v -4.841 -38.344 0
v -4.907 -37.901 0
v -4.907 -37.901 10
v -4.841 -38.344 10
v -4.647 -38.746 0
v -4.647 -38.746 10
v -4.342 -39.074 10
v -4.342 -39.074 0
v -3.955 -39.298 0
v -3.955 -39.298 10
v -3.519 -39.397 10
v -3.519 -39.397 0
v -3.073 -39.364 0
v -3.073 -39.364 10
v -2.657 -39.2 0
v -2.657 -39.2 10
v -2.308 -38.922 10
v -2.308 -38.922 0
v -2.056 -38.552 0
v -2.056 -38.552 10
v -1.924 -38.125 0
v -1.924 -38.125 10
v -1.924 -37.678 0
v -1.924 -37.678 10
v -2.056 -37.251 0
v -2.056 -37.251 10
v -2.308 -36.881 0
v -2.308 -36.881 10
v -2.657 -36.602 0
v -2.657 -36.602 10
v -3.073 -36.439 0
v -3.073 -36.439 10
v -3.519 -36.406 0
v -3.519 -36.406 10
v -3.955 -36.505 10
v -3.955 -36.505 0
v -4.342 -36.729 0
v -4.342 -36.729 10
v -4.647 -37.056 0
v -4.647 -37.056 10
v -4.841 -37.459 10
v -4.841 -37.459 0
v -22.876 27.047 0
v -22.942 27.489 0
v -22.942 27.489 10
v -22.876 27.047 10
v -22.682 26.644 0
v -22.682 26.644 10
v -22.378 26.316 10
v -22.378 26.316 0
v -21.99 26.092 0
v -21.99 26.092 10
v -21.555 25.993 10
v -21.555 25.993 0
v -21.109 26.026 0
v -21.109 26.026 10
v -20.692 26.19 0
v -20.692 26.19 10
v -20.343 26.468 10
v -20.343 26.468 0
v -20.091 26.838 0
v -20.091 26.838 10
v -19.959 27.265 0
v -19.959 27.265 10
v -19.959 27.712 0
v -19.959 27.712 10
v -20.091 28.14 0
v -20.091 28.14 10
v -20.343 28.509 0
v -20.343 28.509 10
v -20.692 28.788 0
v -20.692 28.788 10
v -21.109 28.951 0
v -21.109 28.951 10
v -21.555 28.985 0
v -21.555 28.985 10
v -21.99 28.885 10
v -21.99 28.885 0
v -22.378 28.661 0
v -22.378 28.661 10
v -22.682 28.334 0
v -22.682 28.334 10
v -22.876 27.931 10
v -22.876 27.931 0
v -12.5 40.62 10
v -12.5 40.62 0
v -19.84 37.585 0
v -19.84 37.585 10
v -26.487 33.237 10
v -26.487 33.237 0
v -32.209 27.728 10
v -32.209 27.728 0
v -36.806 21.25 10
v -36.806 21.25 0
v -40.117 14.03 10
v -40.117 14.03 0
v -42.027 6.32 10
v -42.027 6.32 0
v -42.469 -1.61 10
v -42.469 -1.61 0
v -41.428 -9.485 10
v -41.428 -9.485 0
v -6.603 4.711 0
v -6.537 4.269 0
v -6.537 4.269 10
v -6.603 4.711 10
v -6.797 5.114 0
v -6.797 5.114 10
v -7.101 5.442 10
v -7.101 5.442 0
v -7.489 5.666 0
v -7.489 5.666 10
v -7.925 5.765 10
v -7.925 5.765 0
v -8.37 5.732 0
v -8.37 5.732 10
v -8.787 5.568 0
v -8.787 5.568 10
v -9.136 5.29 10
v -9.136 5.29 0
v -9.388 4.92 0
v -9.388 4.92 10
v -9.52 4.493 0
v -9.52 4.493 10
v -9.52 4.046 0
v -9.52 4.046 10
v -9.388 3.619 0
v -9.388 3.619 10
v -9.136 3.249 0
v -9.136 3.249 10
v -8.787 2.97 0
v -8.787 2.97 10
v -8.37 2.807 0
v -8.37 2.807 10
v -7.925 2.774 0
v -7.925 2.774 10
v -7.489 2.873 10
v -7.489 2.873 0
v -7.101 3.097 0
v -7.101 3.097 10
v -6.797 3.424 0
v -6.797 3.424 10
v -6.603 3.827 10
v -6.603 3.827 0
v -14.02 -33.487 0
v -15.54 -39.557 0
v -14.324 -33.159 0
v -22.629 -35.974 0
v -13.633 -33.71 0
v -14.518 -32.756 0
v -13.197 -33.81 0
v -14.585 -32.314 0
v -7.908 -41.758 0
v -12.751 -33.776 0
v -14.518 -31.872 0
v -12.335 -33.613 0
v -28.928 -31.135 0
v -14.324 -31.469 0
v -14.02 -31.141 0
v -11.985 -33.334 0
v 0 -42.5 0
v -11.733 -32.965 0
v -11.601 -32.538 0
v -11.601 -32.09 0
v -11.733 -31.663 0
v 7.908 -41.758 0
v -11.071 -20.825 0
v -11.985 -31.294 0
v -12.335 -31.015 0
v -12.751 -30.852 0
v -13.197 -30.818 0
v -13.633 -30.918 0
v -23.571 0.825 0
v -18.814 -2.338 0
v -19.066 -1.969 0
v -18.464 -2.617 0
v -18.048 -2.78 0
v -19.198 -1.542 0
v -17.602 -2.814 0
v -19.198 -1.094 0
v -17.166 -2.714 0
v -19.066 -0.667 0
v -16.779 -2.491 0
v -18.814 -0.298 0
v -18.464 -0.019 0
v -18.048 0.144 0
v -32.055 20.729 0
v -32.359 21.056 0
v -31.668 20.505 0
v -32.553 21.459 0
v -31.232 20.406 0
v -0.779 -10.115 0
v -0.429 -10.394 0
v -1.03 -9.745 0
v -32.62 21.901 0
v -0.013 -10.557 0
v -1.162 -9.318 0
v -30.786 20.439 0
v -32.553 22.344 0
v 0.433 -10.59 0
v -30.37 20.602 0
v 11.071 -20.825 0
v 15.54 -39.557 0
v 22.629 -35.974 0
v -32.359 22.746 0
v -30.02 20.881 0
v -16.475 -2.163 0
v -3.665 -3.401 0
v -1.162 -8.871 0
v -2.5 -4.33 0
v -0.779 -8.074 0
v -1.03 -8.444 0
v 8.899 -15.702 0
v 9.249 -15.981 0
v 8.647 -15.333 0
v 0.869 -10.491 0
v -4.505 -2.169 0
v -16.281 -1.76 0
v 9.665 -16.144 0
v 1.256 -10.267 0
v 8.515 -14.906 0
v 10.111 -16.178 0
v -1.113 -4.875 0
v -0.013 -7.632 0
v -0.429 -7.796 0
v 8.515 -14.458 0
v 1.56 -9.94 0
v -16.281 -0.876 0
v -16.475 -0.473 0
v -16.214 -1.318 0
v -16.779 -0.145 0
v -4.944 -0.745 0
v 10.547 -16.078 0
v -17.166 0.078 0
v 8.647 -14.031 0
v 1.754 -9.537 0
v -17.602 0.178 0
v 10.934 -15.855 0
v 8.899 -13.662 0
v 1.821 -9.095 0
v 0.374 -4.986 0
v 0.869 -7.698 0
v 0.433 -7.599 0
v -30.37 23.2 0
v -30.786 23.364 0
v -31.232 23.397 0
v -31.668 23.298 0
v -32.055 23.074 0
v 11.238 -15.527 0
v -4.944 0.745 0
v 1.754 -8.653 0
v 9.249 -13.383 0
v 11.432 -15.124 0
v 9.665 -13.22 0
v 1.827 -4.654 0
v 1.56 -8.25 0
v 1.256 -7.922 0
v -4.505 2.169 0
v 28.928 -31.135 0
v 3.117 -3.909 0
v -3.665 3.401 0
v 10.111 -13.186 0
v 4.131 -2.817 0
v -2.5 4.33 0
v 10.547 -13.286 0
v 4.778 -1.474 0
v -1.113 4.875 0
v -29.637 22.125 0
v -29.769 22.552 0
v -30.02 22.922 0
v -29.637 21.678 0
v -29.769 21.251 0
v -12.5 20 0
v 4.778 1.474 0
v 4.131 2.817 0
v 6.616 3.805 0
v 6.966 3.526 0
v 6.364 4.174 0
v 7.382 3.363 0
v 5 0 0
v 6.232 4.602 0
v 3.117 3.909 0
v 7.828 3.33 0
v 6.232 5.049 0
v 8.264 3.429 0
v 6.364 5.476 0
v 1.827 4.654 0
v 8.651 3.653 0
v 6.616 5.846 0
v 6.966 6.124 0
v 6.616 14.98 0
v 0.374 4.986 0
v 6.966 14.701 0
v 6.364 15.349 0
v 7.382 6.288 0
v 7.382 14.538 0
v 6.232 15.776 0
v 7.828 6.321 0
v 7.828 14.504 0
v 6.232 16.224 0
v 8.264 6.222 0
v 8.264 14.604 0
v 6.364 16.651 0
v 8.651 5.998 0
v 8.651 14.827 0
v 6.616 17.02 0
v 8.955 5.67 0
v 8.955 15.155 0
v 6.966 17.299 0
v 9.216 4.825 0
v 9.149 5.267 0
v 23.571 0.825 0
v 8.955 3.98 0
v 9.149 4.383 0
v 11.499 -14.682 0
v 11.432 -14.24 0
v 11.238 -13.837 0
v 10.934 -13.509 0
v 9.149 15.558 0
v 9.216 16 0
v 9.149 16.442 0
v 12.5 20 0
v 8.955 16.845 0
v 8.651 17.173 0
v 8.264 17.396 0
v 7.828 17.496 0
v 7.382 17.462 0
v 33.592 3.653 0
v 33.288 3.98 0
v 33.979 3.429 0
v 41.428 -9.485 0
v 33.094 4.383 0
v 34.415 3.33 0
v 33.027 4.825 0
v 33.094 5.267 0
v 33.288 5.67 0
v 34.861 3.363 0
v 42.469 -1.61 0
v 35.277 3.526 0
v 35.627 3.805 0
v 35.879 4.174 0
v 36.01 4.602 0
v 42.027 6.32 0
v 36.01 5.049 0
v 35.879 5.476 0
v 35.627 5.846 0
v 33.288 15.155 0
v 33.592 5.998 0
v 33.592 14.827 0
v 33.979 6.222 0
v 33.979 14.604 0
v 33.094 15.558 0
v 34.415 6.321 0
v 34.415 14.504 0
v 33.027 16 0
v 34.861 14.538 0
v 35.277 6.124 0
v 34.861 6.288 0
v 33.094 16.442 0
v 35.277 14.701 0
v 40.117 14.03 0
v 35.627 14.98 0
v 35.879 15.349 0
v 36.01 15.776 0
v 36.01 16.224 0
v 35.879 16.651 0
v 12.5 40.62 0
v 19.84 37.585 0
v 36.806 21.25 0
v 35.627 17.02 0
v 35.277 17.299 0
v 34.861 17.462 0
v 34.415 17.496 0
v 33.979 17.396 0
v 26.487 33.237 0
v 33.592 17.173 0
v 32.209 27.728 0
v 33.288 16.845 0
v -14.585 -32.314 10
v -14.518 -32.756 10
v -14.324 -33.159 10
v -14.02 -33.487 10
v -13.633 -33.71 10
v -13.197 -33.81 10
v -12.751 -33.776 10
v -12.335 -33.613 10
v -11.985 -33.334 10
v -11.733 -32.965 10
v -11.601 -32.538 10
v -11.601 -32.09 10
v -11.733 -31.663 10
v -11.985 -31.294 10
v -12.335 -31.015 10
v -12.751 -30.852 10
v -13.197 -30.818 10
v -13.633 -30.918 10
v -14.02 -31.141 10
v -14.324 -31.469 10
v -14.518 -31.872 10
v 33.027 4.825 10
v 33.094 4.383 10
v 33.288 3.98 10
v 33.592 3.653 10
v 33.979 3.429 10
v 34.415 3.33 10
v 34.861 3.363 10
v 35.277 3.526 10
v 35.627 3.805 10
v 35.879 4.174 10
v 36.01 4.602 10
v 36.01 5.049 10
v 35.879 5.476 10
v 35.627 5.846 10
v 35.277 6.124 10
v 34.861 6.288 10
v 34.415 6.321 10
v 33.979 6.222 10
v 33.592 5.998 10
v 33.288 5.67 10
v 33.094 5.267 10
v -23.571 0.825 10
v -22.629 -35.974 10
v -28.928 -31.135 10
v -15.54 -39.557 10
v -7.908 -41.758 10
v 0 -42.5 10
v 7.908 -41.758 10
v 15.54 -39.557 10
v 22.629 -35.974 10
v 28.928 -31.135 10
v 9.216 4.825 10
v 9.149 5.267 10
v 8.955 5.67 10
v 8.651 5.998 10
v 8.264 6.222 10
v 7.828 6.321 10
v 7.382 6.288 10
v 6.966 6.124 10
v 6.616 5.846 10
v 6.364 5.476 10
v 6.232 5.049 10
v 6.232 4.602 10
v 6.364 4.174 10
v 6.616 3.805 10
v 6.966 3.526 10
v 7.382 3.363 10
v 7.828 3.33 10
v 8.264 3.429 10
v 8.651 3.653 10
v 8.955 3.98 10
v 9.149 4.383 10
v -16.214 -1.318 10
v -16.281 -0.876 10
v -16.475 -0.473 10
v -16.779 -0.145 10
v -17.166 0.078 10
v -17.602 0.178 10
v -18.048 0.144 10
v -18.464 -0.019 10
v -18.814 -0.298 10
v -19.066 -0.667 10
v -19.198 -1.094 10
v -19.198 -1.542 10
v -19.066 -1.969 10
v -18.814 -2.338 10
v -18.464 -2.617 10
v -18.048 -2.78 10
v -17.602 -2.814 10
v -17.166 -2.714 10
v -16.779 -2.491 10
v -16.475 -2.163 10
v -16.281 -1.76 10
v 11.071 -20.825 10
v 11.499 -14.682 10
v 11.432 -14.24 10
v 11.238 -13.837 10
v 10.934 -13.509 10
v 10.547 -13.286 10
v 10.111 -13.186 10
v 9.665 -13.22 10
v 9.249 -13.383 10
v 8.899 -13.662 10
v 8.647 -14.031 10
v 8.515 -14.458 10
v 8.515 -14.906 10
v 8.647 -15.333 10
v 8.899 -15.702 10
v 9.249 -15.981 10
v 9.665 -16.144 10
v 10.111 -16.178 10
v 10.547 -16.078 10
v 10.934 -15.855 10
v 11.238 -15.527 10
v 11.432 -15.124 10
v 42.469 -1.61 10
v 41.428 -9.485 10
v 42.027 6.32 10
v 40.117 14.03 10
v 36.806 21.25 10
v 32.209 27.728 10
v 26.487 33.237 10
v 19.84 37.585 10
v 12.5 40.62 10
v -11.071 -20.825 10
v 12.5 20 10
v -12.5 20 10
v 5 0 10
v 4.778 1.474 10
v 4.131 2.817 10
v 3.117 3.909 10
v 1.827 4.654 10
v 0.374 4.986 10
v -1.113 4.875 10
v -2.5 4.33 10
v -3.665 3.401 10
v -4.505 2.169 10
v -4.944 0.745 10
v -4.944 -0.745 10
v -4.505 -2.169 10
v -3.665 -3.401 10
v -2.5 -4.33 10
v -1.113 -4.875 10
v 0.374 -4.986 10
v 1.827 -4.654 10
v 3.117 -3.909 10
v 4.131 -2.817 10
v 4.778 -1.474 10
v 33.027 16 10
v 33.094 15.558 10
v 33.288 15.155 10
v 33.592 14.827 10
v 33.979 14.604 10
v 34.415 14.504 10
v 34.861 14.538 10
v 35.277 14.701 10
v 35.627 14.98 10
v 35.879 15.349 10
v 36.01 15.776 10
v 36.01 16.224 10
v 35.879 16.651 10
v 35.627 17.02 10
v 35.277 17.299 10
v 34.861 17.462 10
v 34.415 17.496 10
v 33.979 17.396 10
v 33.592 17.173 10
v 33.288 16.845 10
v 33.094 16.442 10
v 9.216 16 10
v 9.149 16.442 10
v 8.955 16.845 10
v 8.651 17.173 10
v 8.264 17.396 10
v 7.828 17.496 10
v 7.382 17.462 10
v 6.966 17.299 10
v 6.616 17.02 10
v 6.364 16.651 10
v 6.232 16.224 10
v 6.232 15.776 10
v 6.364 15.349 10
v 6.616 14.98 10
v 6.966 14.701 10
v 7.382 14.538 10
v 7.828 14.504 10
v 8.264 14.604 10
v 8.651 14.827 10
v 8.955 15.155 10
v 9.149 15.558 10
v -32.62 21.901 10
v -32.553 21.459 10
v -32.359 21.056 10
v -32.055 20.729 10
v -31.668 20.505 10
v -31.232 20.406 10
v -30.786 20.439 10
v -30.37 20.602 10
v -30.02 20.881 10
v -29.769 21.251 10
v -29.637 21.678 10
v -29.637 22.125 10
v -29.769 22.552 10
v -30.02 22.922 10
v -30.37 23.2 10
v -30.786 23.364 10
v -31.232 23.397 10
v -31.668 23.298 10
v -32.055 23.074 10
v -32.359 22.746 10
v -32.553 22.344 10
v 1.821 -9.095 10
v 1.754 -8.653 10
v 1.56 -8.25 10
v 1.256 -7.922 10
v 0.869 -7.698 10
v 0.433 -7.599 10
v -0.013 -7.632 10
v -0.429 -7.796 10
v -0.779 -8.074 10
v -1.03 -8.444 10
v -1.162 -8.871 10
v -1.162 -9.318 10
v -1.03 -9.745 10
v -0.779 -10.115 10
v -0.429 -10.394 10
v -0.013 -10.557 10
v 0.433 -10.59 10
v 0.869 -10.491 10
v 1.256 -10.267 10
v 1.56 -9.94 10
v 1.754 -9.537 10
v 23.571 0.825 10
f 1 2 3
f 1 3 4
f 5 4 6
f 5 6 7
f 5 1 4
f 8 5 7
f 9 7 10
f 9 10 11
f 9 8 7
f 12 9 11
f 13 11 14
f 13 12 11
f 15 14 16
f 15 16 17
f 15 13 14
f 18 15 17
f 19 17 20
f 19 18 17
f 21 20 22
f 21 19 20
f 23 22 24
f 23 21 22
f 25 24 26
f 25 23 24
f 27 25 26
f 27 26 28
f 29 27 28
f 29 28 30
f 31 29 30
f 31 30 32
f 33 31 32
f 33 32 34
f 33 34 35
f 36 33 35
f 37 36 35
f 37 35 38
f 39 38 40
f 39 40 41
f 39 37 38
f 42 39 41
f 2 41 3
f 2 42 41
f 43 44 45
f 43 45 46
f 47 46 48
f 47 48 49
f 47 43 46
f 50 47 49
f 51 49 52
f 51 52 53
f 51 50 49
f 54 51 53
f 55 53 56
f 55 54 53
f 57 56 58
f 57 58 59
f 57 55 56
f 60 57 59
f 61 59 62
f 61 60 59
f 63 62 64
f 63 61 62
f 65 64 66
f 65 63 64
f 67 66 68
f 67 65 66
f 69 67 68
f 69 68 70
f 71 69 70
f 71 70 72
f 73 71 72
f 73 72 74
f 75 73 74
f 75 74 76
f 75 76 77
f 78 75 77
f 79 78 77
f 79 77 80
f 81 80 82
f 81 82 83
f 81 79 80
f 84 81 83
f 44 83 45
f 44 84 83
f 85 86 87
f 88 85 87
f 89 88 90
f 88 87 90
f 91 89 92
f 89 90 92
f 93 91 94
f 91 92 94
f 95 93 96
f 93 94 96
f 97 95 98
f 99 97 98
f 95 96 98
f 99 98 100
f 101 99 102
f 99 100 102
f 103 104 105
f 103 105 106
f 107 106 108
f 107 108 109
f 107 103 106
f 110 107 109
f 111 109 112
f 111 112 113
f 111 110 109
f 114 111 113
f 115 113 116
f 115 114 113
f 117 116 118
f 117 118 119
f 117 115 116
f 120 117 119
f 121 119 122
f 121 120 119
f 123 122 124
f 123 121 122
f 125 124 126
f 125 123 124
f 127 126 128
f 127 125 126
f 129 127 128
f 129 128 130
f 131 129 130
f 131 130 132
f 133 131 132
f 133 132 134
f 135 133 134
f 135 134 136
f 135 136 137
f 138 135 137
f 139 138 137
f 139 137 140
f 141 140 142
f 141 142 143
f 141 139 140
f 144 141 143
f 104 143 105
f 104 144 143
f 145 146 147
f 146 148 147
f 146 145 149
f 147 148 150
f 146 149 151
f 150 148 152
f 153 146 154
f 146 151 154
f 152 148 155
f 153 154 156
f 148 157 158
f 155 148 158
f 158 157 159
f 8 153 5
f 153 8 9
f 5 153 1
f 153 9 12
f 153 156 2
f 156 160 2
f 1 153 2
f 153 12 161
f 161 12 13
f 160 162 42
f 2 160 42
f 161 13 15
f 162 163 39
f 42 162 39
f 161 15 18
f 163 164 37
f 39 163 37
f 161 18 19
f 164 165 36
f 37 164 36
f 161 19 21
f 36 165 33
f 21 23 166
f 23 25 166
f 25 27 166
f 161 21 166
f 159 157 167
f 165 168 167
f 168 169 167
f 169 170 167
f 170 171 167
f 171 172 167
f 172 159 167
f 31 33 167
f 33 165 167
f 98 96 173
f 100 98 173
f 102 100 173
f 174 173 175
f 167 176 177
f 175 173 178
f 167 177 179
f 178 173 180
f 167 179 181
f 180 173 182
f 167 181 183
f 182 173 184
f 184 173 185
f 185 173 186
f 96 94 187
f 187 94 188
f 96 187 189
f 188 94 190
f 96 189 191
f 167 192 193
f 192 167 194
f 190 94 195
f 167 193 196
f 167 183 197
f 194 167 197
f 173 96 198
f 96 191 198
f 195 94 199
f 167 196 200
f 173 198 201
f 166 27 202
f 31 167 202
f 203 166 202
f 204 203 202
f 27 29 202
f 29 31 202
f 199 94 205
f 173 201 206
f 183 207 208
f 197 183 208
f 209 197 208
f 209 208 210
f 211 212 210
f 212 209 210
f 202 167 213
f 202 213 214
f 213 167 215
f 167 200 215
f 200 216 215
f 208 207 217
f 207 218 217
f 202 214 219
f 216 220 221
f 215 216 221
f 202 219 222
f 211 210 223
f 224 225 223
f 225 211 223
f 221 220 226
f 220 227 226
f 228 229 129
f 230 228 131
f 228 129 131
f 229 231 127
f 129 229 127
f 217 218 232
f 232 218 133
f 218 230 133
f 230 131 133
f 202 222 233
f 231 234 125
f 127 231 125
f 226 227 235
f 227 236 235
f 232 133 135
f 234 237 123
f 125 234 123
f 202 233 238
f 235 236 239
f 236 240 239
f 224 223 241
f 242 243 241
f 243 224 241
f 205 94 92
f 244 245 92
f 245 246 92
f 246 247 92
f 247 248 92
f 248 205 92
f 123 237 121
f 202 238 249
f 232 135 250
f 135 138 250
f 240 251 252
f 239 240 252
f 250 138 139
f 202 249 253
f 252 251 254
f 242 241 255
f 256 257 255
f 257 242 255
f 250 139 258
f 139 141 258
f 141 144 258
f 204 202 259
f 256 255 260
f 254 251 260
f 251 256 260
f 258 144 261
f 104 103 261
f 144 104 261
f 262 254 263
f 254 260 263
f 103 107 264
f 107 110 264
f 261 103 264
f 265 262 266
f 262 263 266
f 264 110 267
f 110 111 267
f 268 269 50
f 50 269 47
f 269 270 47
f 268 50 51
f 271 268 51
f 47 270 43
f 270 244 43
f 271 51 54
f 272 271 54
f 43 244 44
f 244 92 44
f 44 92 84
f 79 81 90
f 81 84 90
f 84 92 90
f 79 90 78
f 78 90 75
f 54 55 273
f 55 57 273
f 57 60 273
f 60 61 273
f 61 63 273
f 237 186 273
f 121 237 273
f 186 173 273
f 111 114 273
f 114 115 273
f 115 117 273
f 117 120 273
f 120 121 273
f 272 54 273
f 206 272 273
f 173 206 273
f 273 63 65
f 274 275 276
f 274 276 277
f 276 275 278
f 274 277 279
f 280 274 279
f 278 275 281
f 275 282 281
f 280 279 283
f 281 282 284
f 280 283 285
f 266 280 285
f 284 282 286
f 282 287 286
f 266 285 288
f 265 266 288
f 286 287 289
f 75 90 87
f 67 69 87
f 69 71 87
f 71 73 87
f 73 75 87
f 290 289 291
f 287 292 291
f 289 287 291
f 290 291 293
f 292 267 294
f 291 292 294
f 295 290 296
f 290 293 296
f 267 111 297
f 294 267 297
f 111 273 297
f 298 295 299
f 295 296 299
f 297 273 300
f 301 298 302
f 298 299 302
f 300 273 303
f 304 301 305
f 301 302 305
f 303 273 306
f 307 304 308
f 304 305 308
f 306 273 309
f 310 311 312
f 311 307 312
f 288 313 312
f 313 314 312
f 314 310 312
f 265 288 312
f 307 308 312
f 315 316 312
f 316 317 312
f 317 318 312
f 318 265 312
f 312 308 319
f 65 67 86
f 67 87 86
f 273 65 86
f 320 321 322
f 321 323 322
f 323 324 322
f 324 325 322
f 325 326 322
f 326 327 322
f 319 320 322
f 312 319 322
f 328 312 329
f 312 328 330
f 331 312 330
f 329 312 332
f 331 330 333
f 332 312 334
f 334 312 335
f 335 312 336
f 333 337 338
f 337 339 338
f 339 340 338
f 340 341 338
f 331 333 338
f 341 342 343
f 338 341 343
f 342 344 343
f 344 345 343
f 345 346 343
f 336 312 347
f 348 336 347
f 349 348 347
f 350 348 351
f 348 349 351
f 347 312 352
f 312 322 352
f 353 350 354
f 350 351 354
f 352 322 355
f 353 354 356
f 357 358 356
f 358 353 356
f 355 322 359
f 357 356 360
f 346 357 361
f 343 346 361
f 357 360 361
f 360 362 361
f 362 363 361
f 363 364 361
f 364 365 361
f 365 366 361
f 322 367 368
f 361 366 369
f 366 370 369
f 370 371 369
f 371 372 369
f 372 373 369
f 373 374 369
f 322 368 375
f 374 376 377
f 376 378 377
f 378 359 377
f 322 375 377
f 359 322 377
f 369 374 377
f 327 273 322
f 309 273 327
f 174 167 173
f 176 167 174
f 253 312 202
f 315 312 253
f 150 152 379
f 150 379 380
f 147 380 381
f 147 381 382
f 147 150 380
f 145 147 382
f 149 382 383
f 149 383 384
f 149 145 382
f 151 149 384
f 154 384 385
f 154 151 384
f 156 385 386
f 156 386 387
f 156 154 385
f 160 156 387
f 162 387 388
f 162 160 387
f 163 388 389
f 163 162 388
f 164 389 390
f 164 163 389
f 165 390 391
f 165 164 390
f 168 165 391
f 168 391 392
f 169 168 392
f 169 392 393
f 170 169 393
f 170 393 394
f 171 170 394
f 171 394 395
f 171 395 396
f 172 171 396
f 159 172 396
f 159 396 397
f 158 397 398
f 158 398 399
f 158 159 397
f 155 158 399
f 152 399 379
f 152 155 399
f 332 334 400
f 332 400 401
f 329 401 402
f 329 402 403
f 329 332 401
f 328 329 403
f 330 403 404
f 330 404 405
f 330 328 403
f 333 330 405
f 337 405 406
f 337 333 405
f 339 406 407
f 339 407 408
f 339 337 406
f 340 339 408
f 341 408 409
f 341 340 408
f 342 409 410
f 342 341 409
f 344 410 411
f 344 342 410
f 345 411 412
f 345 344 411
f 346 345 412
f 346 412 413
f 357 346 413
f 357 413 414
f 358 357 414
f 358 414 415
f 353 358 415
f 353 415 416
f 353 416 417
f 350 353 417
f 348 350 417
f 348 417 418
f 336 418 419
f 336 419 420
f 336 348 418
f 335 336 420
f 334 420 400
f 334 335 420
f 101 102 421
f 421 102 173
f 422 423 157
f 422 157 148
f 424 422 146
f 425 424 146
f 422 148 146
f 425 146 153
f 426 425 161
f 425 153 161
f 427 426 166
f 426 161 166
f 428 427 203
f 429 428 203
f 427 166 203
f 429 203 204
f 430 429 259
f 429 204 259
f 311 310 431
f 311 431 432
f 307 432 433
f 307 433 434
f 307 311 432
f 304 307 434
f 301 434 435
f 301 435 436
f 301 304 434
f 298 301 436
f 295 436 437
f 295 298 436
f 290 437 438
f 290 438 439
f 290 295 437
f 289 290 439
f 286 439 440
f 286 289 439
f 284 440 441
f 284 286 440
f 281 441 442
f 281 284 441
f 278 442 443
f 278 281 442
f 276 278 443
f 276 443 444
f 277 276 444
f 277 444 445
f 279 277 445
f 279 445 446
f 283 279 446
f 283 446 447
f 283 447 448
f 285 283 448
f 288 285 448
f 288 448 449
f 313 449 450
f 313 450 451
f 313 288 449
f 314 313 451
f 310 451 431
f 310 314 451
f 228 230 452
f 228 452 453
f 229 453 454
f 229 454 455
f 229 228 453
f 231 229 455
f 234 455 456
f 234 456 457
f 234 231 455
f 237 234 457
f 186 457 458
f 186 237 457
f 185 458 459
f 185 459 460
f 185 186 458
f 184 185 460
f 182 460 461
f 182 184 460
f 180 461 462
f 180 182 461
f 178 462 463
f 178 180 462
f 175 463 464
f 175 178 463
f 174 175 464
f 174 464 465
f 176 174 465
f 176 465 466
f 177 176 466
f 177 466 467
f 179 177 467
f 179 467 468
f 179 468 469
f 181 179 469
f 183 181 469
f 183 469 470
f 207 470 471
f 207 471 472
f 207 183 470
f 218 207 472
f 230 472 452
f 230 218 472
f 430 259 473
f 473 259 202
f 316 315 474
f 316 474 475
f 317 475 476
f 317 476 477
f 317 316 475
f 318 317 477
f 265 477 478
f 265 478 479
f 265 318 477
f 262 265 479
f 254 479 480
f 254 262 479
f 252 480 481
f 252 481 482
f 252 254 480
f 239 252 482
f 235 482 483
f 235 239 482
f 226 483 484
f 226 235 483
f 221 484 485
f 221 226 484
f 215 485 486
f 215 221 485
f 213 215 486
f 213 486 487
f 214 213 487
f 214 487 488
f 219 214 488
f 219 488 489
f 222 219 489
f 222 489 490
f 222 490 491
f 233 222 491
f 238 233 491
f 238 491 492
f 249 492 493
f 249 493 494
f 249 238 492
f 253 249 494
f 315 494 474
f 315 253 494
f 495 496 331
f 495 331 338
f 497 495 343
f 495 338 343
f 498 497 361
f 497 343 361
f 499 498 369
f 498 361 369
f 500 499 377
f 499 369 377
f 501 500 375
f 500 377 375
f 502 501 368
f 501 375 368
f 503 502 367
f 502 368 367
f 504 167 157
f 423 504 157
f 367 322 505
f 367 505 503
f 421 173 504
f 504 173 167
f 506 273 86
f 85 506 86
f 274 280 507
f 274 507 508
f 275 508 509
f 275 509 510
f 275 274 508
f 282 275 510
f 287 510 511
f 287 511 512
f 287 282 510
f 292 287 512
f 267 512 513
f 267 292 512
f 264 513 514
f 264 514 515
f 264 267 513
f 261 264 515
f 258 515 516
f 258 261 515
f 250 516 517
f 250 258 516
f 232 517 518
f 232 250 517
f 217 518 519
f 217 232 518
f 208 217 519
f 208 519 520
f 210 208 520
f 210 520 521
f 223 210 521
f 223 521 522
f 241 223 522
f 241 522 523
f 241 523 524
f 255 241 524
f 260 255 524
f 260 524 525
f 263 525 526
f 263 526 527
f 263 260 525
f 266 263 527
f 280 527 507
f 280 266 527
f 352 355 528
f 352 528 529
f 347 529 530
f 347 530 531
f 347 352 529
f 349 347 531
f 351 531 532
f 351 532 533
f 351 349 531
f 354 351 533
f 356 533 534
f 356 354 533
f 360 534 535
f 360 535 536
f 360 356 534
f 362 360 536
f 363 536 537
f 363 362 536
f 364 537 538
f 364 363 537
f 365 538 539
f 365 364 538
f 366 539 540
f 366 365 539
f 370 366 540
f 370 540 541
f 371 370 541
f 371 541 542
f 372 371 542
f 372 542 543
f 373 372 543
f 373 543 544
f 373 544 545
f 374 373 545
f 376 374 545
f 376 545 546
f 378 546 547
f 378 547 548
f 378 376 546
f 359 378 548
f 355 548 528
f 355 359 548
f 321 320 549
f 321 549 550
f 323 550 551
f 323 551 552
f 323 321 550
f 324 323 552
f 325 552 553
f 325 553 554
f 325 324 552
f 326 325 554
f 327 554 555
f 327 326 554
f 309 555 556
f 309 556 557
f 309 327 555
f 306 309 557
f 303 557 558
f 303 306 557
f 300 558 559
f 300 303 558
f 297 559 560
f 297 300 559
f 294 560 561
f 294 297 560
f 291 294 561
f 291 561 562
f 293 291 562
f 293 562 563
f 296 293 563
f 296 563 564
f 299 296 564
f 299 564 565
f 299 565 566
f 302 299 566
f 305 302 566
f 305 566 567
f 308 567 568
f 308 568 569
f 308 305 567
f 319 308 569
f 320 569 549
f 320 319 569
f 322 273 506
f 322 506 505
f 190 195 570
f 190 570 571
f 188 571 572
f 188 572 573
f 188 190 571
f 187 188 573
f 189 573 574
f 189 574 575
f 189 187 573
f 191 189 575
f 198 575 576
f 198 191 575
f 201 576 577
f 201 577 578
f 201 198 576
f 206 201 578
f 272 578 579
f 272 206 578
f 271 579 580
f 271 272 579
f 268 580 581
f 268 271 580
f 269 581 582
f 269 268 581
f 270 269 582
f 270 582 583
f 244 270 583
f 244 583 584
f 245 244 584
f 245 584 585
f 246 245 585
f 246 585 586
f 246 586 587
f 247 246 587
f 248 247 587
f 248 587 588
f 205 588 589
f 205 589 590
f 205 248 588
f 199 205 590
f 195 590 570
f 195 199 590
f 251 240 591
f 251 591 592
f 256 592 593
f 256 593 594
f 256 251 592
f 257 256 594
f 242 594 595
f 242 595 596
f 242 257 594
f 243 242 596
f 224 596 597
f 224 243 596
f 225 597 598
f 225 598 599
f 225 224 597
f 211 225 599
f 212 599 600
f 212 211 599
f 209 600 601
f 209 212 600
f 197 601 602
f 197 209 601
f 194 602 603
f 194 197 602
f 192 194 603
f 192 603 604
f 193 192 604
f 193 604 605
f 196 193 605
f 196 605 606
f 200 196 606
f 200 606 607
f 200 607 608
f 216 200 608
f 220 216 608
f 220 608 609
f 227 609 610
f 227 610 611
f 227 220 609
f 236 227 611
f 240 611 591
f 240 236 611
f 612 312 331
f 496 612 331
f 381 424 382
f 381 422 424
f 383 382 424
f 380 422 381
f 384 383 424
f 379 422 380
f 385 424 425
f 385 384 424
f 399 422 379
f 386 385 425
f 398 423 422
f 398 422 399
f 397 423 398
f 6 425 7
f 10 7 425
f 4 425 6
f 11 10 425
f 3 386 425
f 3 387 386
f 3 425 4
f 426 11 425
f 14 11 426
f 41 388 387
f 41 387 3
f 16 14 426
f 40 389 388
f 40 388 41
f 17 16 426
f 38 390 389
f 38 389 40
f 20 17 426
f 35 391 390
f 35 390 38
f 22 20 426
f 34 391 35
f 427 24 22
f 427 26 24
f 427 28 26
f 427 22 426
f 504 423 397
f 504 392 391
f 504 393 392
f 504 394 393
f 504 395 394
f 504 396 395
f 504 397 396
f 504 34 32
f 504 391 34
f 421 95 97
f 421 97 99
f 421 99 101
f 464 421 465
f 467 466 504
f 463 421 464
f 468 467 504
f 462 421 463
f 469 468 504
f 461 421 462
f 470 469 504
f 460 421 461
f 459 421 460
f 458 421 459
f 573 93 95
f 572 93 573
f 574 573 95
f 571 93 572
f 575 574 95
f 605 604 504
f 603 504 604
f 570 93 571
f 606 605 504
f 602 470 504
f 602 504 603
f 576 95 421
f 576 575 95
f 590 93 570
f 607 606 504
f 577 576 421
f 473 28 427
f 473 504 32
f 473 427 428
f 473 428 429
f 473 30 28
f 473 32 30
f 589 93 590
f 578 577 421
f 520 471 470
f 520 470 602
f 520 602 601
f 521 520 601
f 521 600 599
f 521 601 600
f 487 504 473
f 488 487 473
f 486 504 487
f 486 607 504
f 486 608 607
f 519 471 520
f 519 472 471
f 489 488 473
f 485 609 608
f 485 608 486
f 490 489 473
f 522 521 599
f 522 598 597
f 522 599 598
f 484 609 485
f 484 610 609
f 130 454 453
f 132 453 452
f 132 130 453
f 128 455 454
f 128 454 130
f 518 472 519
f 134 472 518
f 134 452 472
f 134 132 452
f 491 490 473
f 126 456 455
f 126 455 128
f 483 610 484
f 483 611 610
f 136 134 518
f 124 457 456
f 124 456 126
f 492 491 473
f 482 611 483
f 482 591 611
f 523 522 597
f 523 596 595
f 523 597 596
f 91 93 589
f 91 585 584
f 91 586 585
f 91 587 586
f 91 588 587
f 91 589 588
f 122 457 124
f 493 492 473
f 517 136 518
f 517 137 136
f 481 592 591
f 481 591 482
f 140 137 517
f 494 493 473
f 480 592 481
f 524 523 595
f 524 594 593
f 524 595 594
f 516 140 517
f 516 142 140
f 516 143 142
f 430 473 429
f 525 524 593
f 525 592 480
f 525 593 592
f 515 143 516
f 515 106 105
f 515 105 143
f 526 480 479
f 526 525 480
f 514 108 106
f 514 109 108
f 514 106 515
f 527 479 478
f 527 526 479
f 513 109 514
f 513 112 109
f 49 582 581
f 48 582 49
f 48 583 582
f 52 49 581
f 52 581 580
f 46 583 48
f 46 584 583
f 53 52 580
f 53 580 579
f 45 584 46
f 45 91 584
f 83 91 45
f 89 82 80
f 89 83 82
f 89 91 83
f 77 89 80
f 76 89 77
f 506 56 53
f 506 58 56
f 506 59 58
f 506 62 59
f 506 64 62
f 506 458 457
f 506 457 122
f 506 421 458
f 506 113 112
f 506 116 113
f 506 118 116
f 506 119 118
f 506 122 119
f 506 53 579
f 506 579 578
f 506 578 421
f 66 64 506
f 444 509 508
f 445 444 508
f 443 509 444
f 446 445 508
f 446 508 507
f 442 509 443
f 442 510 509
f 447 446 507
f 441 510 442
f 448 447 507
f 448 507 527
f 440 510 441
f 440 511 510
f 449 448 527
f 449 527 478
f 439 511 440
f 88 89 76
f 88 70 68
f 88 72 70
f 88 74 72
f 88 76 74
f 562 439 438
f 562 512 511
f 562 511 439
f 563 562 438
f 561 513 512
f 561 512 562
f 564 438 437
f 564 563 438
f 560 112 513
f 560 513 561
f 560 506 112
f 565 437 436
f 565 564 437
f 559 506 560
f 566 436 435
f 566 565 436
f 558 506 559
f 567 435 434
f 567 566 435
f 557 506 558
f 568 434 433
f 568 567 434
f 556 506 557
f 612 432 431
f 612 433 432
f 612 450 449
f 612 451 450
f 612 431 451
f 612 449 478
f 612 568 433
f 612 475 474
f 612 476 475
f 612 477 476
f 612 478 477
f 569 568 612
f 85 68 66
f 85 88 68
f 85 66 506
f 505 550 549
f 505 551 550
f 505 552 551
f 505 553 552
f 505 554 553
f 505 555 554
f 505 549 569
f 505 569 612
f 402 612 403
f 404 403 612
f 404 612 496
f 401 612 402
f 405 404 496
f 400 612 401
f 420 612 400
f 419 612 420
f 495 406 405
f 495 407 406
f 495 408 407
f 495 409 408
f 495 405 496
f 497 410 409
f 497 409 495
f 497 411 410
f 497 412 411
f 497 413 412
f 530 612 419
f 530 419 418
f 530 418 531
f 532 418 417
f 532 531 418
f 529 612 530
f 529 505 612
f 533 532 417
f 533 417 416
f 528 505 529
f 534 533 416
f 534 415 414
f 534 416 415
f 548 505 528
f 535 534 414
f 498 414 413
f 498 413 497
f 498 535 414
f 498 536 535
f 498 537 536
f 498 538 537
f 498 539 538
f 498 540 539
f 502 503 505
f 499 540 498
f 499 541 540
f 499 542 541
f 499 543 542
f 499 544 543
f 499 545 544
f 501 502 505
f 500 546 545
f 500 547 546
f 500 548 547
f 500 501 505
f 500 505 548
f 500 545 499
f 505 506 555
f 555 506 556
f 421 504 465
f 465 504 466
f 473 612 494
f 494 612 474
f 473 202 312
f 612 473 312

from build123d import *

# Parameters (mm, degrees)
SKETCH4_R      = 42.5
BASE_DEPTH     = 10
SKETCH5_R      = 5
SKETCH5_W      = 25
SKETCH5_H      = 40
TYRE_CUT_DEPTH = 10
SKETCH6_R      = 1.5
NUTS_DEPTH     = 10


with BuildPart() as part:
    # Sketch4 → base (new body)
    with BuildSketch(Plane.XY):
        Circle(SKETCH4_R)
    extrude(amount=BASE_DEPTH)

    # Sketch5 → Tyre cut (cut)
    with BuildSketch(Plane.XY):
        Circle(SKETCH5_R)
        with Locations((0, 40)):
            Rectangle(SKETCH5_W, SKETCH5_H)
        Polygon((11.070508076, -20.825317547), (23.570508076, 0.825317547), (58.211524227, -19.174682453), (45.711524227, -40.825317547), align=None)
        Polygon((-23.570508076, 0.825317547), (-11.070508076, -20.825317547), (-45.711524227, -40.825317547), (-58.211524227, -19.174682453), align=None)
    extrude(amount=TYRE_CUT_DEPTH, mode=Mode.SUBTRACT)

    # Sketch6 → NUTs (cut)
    with BuildSketch(Plane.XY):
        with Locations((7.71570735, 16)):
            Circle(SKETCH6_R)
        with Locations((7.71570735, 4.825317547)):
            Circle(SKETCH6_R)
        with Locations(Location((34.527154016, 4.825317547, 0), (0, 0, 180))):
            Circle(SKETCH6_R)
        with Locations(Location((34.527154016, 16, 0), (0, 0, 180))):
            Circle(SKETCH6_R)
        with Locations((9.998552785, -14.681998573)):
            Circle(SKETCH6_R)
        with Locations((0.320993902, -9.094657347)):
            Circle(SKETCH6_R)
        with Locations(Location((-13.084729431, -32.314051272, 0), (0, 0, 180))):
            Circle(SKETCH6_R)
        with Locations(Location((-3.407170547, -37.901392498, 0), (0, 0, 180))):
            Circle(SKETCH6_R)
        with Locations((-17.714260136, -1.318001427)):
            Circle(SKETCH6_R)
        with Locations((-8.036701252, 4.2693398)):
            Circle(SKETCH6_R)
        with Locations(Location((-21.442424585, 27.488733725, 0), (0, 0, 180))):
            Circle(SKETCH6_R)
        with Locations(Location((-31.119983469, 21.901392498, 0), (0, 0, 180))):
            Circle(SKETCH6_R)
    extrude(amount=NUTS_DEPTH, mode=Mode.SUBTRACT)


solid = part.part
